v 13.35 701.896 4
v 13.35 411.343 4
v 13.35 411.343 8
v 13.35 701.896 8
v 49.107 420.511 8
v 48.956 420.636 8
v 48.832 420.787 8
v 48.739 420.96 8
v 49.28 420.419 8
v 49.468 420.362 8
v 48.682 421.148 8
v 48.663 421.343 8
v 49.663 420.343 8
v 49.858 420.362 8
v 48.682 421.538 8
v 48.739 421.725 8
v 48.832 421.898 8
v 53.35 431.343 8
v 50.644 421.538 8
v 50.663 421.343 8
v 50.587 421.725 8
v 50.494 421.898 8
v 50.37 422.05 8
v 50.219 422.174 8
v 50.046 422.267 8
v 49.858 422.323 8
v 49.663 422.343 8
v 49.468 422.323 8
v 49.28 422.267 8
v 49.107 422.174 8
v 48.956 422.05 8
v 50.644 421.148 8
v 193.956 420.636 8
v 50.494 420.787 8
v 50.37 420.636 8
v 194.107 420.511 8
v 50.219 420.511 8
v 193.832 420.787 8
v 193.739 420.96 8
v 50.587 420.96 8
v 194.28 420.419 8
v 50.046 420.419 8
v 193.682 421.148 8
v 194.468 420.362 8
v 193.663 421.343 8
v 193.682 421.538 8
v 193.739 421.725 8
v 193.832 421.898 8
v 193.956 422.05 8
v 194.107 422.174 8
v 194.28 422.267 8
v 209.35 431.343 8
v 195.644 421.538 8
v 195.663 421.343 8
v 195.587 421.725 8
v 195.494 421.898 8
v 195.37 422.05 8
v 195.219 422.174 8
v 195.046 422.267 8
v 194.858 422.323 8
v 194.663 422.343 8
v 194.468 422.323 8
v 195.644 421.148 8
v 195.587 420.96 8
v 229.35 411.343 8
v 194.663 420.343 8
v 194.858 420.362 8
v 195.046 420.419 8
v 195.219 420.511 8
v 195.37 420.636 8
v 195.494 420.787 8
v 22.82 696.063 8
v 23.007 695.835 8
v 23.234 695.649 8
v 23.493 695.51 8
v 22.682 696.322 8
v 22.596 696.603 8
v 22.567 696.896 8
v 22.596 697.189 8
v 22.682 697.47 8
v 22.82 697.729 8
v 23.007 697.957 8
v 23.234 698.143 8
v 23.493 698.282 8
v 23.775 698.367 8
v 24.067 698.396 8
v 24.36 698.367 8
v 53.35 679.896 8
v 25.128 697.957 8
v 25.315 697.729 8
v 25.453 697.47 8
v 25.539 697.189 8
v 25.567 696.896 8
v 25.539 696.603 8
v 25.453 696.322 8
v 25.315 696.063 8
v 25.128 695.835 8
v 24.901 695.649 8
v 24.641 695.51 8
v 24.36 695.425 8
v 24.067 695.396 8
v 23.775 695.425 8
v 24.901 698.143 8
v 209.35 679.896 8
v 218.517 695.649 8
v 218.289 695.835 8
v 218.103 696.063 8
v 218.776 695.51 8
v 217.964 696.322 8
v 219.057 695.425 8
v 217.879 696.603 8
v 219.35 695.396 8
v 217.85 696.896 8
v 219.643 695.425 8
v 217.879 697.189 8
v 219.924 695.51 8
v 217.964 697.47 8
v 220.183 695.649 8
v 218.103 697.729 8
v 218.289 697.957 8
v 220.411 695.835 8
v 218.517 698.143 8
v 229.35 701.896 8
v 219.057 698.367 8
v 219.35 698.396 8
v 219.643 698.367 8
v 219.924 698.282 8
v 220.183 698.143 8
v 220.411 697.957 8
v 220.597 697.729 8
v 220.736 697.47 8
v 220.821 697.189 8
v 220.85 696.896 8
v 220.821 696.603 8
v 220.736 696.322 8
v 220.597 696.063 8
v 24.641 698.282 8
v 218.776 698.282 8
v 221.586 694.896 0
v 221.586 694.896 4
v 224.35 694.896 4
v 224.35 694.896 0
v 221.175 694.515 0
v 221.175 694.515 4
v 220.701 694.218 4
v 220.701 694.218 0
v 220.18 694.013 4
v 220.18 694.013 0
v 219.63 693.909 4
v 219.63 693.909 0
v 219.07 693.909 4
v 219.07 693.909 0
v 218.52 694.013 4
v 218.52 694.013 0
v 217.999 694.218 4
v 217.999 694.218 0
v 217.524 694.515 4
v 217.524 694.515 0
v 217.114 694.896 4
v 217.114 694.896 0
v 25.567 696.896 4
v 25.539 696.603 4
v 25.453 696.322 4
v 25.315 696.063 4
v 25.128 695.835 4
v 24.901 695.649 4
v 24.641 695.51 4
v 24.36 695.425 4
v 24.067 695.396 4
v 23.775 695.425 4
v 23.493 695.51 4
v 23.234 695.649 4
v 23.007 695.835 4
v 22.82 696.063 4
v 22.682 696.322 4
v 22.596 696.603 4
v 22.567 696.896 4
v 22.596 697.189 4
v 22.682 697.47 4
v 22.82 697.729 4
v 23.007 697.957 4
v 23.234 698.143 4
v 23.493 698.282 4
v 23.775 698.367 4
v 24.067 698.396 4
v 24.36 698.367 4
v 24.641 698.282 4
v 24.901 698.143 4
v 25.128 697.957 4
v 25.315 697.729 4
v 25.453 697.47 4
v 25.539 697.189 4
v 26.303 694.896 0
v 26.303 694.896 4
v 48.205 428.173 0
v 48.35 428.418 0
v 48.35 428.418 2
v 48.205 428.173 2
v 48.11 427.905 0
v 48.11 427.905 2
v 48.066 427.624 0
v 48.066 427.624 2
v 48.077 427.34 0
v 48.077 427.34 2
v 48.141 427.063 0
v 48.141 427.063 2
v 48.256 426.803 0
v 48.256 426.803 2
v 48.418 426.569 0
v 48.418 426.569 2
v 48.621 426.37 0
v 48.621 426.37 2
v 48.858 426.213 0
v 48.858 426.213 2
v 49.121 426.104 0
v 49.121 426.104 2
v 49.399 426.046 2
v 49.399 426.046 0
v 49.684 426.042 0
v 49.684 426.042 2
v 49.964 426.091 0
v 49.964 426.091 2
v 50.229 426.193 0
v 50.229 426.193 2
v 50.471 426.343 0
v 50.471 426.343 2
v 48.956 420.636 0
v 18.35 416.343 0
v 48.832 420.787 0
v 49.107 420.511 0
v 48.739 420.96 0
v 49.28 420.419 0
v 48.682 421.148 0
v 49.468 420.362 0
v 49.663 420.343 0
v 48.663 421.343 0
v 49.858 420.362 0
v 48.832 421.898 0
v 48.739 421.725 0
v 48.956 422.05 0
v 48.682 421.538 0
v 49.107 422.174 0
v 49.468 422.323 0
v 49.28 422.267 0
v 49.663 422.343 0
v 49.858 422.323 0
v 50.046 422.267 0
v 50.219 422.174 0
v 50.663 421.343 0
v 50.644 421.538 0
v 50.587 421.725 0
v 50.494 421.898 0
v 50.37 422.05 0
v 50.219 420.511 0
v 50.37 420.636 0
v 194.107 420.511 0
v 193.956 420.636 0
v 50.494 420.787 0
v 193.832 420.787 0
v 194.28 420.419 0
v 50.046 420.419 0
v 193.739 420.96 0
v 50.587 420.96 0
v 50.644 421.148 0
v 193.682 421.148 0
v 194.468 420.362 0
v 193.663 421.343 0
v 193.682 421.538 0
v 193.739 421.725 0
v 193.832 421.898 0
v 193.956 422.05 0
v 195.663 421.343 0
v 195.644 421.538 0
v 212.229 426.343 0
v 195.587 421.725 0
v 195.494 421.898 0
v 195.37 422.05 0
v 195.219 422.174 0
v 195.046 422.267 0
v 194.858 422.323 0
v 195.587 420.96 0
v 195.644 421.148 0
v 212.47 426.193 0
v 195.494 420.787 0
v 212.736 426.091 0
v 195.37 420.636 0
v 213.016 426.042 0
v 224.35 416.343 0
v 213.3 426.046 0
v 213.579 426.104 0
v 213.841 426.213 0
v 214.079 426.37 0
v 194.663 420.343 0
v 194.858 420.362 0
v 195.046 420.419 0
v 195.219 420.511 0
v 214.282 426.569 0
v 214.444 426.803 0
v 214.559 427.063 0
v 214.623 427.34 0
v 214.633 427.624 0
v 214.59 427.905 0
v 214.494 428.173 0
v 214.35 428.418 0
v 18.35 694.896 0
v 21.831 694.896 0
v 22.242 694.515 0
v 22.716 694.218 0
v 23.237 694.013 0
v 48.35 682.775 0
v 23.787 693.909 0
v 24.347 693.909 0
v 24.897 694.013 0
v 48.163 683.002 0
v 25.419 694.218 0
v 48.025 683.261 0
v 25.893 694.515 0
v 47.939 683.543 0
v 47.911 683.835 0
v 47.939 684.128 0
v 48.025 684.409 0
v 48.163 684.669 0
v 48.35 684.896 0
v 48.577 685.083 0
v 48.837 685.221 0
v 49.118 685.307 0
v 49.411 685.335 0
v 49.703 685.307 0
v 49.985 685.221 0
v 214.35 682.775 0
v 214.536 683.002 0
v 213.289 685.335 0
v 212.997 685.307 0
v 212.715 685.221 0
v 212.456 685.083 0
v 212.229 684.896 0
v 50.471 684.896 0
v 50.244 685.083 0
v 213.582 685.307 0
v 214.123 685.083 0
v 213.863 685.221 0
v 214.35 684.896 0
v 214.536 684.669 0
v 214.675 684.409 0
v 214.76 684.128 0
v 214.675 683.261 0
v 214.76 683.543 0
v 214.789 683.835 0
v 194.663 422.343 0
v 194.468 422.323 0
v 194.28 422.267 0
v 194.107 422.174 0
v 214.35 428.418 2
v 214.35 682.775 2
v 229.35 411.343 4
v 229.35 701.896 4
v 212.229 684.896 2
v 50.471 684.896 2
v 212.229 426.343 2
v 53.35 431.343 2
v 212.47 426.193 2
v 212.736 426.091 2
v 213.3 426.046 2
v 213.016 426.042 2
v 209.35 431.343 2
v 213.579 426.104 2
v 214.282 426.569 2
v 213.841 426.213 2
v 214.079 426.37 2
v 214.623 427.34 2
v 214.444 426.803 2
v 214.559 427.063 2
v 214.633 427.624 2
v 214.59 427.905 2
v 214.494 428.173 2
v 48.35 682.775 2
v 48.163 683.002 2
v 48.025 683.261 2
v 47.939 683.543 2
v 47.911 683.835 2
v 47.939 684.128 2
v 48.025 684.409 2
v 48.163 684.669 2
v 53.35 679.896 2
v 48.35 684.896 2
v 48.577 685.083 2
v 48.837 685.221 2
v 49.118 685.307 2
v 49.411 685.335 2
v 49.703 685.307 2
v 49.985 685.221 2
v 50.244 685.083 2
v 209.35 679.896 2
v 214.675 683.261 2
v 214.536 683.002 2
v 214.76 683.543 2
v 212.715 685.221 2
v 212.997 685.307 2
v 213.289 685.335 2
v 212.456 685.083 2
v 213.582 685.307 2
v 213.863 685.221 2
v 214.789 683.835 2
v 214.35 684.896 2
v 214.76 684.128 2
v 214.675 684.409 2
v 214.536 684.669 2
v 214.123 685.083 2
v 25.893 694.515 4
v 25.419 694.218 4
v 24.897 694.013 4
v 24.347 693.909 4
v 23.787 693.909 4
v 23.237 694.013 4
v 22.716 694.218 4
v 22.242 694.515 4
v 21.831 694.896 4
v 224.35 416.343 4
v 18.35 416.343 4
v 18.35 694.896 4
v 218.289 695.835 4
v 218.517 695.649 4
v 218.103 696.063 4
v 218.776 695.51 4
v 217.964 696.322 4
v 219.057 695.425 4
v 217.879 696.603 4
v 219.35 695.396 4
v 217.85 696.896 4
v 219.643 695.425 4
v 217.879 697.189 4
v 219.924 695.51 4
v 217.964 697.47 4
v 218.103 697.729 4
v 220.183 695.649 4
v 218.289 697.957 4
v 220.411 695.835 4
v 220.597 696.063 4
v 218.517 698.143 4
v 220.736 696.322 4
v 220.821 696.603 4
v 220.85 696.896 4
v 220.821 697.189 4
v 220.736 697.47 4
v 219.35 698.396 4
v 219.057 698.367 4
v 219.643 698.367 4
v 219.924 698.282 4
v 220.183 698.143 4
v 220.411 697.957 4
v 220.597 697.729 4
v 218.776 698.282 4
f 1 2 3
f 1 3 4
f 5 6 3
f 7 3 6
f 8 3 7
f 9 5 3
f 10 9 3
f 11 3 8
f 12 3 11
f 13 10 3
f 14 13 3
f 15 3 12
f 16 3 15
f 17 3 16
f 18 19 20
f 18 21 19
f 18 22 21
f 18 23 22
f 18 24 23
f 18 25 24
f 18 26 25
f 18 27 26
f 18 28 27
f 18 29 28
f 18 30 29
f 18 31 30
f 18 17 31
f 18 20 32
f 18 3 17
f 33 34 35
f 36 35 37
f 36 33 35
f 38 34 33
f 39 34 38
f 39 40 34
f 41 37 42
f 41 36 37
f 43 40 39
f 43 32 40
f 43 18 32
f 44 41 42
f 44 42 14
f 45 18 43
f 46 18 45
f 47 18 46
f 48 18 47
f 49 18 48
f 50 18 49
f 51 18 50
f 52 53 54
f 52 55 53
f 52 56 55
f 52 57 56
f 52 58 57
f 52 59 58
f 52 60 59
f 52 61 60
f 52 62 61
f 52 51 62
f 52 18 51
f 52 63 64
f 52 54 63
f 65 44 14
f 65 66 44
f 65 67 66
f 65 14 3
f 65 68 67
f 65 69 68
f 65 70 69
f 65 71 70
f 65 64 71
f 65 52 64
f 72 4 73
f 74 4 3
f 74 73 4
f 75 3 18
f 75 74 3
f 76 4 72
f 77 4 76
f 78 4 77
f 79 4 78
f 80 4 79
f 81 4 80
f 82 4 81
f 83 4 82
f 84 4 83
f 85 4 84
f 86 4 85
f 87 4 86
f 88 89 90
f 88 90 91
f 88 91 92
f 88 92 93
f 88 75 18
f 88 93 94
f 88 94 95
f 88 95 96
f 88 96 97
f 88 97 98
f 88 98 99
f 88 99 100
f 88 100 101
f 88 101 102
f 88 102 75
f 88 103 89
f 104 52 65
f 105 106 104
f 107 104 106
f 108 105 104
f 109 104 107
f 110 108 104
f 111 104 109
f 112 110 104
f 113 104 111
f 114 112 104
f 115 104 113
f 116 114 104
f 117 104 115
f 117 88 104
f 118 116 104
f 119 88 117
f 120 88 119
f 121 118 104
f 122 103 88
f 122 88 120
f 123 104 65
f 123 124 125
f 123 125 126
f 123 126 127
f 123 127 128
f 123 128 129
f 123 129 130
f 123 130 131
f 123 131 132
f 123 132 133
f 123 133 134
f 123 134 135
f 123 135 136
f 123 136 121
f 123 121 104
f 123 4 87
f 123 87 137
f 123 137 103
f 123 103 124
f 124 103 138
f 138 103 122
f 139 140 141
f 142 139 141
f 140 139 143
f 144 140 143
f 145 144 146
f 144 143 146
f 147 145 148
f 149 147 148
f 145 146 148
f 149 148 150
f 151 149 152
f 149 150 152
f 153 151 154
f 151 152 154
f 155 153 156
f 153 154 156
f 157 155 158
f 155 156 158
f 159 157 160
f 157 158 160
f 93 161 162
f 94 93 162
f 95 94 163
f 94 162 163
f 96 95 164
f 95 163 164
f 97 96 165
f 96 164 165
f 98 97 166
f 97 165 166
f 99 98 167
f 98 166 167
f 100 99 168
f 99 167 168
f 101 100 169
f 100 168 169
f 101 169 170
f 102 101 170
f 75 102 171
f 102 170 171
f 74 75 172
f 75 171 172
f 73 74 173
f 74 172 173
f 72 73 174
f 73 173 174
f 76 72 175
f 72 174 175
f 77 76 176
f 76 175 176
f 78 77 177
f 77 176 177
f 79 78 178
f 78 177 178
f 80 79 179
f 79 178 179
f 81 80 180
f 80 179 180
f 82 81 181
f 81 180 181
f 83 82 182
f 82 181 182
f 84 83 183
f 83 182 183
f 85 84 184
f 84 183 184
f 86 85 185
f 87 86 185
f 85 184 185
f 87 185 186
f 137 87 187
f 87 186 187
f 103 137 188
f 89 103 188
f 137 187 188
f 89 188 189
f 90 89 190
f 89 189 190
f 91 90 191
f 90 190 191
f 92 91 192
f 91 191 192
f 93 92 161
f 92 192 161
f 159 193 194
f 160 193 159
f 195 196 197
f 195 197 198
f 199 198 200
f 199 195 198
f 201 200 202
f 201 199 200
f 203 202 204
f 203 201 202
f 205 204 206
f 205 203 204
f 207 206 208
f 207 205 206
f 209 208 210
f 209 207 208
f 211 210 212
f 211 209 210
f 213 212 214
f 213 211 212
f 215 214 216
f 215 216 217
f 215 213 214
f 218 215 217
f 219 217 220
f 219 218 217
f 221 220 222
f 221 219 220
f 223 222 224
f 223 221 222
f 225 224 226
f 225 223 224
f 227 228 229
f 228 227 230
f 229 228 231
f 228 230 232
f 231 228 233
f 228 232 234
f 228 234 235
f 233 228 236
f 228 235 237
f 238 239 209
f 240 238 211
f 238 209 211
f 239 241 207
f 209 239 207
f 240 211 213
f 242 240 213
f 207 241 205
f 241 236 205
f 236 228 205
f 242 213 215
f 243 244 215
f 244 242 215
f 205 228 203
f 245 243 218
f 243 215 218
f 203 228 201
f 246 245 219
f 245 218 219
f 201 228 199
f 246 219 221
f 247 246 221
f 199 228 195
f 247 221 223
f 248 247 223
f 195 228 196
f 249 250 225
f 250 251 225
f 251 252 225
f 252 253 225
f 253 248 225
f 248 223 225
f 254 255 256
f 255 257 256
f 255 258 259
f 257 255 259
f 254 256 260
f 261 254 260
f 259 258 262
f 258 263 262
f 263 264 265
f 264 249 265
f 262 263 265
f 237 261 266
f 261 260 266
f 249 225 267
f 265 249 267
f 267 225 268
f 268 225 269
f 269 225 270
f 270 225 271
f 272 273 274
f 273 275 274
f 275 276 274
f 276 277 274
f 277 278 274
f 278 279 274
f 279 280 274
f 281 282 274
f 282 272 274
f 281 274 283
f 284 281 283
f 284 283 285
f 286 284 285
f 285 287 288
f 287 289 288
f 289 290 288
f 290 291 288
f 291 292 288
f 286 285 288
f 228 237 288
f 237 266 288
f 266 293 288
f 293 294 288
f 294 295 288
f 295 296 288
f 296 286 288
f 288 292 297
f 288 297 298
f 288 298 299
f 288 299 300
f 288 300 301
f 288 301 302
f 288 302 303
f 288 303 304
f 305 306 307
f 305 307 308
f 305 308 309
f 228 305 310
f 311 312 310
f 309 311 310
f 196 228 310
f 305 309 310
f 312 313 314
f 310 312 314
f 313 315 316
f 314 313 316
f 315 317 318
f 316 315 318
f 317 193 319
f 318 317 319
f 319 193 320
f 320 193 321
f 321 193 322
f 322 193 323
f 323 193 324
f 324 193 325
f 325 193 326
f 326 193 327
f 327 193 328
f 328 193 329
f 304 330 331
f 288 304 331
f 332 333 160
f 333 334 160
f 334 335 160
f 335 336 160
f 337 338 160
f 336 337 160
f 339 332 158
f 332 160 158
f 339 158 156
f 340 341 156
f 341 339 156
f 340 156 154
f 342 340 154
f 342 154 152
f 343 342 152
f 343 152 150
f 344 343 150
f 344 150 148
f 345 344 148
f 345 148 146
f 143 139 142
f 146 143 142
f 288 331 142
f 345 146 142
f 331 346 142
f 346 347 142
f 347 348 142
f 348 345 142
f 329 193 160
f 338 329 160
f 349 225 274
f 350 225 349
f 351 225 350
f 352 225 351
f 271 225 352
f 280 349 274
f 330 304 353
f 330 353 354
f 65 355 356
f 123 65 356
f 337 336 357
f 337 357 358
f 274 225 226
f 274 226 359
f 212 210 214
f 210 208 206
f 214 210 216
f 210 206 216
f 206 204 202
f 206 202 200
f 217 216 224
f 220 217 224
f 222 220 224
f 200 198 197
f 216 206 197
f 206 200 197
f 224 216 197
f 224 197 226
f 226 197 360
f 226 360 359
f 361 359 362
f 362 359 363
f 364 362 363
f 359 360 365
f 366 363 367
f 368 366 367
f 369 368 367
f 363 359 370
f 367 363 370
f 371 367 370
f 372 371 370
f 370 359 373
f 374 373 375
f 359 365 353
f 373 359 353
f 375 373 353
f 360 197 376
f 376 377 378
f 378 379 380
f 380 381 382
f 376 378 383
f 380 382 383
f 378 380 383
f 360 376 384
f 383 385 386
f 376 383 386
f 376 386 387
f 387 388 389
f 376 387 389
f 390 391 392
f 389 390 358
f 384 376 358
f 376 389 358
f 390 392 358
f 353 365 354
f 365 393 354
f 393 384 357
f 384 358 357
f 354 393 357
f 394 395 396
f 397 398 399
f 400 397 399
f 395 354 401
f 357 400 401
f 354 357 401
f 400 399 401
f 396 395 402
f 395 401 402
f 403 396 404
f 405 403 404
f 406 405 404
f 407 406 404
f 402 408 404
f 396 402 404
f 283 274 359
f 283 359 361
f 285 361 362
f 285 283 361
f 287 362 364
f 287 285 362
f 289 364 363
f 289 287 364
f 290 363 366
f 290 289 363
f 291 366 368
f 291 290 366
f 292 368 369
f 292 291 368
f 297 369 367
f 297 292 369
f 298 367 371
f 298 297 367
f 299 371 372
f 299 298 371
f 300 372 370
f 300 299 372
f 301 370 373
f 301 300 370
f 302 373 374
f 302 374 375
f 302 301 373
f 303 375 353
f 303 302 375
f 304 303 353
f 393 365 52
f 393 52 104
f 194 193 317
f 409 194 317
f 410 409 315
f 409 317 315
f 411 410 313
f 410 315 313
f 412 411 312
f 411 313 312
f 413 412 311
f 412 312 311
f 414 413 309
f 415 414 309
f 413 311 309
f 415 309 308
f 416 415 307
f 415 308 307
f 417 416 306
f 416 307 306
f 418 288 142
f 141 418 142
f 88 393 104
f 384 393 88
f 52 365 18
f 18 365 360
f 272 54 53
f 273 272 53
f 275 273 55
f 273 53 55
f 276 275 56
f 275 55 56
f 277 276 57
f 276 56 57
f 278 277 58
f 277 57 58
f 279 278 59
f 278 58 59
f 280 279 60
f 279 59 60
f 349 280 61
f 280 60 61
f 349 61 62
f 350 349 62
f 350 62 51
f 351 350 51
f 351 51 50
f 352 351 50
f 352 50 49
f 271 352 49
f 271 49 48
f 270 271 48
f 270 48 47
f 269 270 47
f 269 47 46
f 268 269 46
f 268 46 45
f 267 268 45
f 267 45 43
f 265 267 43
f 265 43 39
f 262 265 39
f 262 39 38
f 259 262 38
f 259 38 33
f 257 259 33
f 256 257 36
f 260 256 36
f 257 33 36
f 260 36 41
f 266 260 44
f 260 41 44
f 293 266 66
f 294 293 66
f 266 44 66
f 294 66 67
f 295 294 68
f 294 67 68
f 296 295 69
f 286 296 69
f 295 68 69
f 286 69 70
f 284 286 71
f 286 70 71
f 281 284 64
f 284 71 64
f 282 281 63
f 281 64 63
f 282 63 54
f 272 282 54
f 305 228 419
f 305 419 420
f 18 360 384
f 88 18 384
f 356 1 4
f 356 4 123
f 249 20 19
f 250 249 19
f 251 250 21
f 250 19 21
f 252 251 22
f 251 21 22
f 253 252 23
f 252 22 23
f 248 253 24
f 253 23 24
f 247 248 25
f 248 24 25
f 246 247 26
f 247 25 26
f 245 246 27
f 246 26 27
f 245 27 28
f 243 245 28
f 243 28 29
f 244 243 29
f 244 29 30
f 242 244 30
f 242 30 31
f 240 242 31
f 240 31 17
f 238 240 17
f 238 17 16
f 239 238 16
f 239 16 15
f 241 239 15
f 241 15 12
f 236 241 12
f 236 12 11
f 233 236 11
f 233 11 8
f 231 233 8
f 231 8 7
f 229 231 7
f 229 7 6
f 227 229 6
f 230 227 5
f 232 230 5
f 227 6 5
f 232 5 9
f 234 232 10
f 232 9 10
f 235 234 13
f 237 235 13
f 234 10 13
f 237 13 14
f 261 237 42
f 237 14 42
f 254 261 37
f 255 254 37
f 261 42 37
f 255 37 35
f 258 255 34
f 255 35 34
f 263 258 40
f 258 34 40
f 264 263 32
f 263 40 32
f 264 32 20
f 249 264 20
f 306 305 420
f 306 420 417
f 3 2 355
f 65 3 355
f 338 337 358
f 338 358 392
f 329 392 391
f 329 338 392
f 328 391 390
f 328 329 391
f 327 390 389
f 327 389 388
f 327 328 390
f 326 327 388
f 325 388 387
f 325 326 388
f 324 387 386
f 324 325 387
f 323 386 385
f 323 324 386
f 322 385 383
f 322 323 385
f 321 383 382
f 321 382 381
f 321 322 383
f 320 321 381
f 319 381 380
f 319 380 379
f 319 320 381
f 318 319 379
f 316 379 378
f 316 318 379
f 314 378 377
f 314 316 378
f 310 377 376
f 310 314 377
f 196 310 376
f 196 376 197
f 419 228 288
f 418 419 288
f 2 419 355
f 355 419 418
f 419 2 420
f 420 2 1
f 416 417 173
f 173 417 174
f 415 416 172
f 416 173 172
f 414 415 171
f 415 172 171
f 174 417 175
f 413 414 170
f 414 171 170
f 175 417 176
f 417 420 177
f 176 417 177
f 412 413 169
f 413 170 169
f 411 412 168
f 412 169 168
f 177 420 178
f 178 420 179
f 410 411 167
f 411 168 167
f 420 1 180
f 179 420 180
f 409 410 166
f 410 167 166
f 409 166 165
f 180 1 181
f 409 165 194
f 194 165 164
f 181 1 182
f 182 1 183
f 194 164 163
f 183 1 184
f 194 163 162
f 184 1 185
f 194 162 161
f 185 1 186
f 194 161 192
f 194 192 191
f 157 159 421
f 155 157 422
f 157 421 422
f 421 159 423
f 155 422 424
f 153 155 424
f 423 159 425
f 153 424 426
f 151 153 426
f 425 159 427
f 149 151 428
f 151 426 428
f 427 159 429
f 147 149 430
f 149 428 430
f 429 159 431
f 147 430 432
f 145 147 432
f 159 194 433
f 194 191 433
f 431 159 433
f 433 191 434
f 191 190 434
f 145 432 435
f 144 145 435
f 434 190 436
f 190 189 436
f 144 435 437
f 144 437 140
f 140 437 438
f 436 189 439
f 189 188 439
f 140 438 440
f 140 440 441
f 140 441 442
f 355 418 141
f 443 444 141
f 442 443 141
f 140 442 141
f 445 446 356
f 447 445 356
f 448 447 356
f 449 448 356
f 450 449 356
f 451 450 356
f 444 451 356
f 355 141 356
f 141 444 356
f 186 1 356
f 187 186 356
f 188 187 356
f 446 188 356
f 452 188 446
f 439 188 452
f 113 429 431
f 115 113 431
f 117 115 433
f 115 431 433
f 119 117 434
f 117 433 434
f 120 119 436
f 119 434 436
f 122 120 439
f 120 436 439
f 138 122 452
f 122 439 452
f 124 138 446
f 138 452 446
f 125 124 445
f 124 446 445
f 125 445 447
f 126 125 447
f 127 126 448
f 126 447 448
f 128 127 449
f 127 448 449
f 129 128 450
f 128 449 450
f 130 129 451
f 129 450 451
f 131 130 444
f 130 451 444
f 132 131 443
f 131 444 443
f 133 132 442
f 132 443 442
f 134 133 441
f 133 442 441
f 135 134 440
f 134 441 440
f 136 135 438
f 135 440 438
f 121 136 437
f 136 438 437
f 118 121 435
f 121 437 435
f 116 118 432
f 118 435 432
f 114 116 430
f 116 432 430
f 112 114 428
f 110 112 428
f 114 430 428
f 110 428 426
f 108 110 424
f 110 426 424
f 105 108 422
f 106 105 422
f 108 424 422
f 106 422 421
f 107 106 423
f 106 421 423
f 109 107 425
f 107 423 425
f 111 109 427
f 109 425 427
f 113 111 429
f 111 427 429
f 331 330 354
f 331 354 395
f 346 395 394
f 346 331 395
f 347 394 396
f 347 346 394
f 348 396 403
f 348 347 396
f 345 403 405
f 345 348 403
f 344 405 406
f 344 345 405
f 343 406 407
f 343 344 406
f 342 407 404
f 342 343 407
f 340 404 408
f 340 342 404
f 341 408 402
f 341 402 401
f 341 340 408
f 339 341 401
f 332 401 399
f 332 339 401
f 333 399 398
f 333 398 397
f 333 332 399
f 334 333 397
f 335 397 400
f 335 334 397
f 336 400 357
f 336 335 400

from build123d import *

# Parameters (mm, degrees)
ESQUISSE1_W             = 206
ESQUISSE1_H             = 278.55339059
BOSS_EXTRU_1_DEPTH      = 4
ESQUISSE2_W             = 216
ESQUISSE2_H             = 290.55339059
BOSS_EXTRU_2_DEPTH      = 4
ESQUISSE3_W             = 156
ESQUISSE3_H             = 248.55339059
ENL_V_MAT_EXTRU_1_DEPTH = 8
ENL_V_MAT_EXTRU_2_DEPTH = 2
ESQUISSE5_R             = 1.5
ENL_V_MAT_EXTRU_3_DEPTH = 4
ESQUISSE6_R             = 3
ENL_V_MAT_EXTRU_4_DEPTH = 4
ESQUISSE7_R             = 1
ENL_V_MAT_EXTRU_5_DEPTH = 739.46020643


with BuildPart() as part:
    # Esquisse1 → Boss.-Extru.1 (new body)
    with BuildSketch(Plane.XY):
        with Locations((121.349909903, 555.619376292)):
            Rectangle(ESQUISSE1_W, ESQUISSE1_H)
    extrude(amount=BOSS_EXTRU_1_DEPTH)

    # Esquisse2 → Boss.-Extru.2 (add)
    with BuildSketch(Plane.XY.offset(4)):
        with Locations((121.349909903, 556.619376292)):
            Rectangle(ESQUISSE2_W, ESQUISSE2_H)
    extrude(amount=BOSS_EXTRU_2_DEPTH)

    # Esquisse3 → Enlèv. mat.-Extru.1 (cut)
    with BuildSketch(Plane(origin=(0, 0, 0), x_dir=(-1, 0, 0), z_dir=(0, 0, -1))):
        with Locations((-131.349909903, 555.619376292)):
            Rectangle(ESQUISSE3_W, ESQUISSE3_H)
    extrude(amount=-ENL_V_MAT_EXTRU_1_DEPTH, mode=Mode.SUBTRACT)

    # Esquisse4 → Enlèv. mat.-Extru.2 (cut)
    with BuildSketch(Plane(origin=(0, 0, 0), x_dir=(-1, 0, 0), z_dir=(0, 0, -1))):
        with BuildLine():
            Line((-212.228589559, 684.896071587), (-50.471230246, 684.896071587))
            ThreePointArc((-50.471230246, 684.896071587), (-48.349909903, 684.896071587), (-48.349909903, 682.774751243))
            Line((-48.349909903, 682.774751243), (-48.349909903, 428.418245014))
            ThreePointArc((-48.349909903, 428.418245014), (-48.51477084, 426.464915653), (-50.471230246, 426.342680997))
            Line((-50.471230246, 426.342680997), (-51.11665592, 426.342680997))
            Line((-51.11665592, 426.342680997), (-211.583163885, 426.342680997))
            Line((-211.583163885, 426.342680997), (-212.228589559, 426.342680997))
            ThreePointArc((-212.228589559, 426.342680997), (-214.185048965, 426.464915653), (-214.349909903, 428.418245014))
            Line((-214.349909903, 428.418245014), (-214.349909903, 682.774751243))
            ThreePointArc((-214.349909903, 682.774751243), (-214.349909903, 684.896071587), (-212.228589559, 684.896071587))
        make_face()
    extrude(amount=-ENL_V_MAT_EXTRU_2_DEPTH, mode=Mode.SUBTRACT)

    # Esquisse5 → Enlèv. mat.-Extru.3 (cut)
    with BuildSketch(Plane(origin=(0, 0, 4), x_dir=(-1, 0, 0), z_dir=(0, 0, -1))):
        with Locations((-219.349909903, 696.896071587)):
            Circle(ESQUISSE5_R)
        with Locations(Location((-24.067400597, 696.896071587, 0), (0, 0, 180))):
            Circle(ESQUISSE5_R)
    extrude(amount=-ENL_V_MAT_EXTRU_3_DEPTH, mode=Mode.SUBTRACT)

    # Esquisse6 → Enlèv. mat.-Extru.4 (cut)
    with BuildSketch(Plane(origin=(0, 0, 0), x_dir=(-1, 0, 0), z_dir=(0, 0, -1))):
        with Locations((-24.067400597, 696.896071587)):
            Circle(ESQUISSE6_R)
        with Locations((-219.349909903, 696.896071587)):
            Circle(ESQUISSE6_R)
    extrude(amount=-ENL_V_MAT_EXTRU_4_DEPTH, mode=Mode.SUBTRACT)

    # Esquisse7 → Enlèv. mat.-Extru.5 (cut, through all)
    with BuildSketch(Plane.XY.offset(8)):
        with Locations((49.662982919, 421.342680997)):
            Circle(ESQUISSE7_R)
        with Locations((194.662982919, 421.342680997)):
            Circle(ESQUISSE7_R)
    extrude(amount=-ENL_V_MAT_EXTRU_5_DEPTH, mode=Mode.SUBTRACT)


solid = part.part
